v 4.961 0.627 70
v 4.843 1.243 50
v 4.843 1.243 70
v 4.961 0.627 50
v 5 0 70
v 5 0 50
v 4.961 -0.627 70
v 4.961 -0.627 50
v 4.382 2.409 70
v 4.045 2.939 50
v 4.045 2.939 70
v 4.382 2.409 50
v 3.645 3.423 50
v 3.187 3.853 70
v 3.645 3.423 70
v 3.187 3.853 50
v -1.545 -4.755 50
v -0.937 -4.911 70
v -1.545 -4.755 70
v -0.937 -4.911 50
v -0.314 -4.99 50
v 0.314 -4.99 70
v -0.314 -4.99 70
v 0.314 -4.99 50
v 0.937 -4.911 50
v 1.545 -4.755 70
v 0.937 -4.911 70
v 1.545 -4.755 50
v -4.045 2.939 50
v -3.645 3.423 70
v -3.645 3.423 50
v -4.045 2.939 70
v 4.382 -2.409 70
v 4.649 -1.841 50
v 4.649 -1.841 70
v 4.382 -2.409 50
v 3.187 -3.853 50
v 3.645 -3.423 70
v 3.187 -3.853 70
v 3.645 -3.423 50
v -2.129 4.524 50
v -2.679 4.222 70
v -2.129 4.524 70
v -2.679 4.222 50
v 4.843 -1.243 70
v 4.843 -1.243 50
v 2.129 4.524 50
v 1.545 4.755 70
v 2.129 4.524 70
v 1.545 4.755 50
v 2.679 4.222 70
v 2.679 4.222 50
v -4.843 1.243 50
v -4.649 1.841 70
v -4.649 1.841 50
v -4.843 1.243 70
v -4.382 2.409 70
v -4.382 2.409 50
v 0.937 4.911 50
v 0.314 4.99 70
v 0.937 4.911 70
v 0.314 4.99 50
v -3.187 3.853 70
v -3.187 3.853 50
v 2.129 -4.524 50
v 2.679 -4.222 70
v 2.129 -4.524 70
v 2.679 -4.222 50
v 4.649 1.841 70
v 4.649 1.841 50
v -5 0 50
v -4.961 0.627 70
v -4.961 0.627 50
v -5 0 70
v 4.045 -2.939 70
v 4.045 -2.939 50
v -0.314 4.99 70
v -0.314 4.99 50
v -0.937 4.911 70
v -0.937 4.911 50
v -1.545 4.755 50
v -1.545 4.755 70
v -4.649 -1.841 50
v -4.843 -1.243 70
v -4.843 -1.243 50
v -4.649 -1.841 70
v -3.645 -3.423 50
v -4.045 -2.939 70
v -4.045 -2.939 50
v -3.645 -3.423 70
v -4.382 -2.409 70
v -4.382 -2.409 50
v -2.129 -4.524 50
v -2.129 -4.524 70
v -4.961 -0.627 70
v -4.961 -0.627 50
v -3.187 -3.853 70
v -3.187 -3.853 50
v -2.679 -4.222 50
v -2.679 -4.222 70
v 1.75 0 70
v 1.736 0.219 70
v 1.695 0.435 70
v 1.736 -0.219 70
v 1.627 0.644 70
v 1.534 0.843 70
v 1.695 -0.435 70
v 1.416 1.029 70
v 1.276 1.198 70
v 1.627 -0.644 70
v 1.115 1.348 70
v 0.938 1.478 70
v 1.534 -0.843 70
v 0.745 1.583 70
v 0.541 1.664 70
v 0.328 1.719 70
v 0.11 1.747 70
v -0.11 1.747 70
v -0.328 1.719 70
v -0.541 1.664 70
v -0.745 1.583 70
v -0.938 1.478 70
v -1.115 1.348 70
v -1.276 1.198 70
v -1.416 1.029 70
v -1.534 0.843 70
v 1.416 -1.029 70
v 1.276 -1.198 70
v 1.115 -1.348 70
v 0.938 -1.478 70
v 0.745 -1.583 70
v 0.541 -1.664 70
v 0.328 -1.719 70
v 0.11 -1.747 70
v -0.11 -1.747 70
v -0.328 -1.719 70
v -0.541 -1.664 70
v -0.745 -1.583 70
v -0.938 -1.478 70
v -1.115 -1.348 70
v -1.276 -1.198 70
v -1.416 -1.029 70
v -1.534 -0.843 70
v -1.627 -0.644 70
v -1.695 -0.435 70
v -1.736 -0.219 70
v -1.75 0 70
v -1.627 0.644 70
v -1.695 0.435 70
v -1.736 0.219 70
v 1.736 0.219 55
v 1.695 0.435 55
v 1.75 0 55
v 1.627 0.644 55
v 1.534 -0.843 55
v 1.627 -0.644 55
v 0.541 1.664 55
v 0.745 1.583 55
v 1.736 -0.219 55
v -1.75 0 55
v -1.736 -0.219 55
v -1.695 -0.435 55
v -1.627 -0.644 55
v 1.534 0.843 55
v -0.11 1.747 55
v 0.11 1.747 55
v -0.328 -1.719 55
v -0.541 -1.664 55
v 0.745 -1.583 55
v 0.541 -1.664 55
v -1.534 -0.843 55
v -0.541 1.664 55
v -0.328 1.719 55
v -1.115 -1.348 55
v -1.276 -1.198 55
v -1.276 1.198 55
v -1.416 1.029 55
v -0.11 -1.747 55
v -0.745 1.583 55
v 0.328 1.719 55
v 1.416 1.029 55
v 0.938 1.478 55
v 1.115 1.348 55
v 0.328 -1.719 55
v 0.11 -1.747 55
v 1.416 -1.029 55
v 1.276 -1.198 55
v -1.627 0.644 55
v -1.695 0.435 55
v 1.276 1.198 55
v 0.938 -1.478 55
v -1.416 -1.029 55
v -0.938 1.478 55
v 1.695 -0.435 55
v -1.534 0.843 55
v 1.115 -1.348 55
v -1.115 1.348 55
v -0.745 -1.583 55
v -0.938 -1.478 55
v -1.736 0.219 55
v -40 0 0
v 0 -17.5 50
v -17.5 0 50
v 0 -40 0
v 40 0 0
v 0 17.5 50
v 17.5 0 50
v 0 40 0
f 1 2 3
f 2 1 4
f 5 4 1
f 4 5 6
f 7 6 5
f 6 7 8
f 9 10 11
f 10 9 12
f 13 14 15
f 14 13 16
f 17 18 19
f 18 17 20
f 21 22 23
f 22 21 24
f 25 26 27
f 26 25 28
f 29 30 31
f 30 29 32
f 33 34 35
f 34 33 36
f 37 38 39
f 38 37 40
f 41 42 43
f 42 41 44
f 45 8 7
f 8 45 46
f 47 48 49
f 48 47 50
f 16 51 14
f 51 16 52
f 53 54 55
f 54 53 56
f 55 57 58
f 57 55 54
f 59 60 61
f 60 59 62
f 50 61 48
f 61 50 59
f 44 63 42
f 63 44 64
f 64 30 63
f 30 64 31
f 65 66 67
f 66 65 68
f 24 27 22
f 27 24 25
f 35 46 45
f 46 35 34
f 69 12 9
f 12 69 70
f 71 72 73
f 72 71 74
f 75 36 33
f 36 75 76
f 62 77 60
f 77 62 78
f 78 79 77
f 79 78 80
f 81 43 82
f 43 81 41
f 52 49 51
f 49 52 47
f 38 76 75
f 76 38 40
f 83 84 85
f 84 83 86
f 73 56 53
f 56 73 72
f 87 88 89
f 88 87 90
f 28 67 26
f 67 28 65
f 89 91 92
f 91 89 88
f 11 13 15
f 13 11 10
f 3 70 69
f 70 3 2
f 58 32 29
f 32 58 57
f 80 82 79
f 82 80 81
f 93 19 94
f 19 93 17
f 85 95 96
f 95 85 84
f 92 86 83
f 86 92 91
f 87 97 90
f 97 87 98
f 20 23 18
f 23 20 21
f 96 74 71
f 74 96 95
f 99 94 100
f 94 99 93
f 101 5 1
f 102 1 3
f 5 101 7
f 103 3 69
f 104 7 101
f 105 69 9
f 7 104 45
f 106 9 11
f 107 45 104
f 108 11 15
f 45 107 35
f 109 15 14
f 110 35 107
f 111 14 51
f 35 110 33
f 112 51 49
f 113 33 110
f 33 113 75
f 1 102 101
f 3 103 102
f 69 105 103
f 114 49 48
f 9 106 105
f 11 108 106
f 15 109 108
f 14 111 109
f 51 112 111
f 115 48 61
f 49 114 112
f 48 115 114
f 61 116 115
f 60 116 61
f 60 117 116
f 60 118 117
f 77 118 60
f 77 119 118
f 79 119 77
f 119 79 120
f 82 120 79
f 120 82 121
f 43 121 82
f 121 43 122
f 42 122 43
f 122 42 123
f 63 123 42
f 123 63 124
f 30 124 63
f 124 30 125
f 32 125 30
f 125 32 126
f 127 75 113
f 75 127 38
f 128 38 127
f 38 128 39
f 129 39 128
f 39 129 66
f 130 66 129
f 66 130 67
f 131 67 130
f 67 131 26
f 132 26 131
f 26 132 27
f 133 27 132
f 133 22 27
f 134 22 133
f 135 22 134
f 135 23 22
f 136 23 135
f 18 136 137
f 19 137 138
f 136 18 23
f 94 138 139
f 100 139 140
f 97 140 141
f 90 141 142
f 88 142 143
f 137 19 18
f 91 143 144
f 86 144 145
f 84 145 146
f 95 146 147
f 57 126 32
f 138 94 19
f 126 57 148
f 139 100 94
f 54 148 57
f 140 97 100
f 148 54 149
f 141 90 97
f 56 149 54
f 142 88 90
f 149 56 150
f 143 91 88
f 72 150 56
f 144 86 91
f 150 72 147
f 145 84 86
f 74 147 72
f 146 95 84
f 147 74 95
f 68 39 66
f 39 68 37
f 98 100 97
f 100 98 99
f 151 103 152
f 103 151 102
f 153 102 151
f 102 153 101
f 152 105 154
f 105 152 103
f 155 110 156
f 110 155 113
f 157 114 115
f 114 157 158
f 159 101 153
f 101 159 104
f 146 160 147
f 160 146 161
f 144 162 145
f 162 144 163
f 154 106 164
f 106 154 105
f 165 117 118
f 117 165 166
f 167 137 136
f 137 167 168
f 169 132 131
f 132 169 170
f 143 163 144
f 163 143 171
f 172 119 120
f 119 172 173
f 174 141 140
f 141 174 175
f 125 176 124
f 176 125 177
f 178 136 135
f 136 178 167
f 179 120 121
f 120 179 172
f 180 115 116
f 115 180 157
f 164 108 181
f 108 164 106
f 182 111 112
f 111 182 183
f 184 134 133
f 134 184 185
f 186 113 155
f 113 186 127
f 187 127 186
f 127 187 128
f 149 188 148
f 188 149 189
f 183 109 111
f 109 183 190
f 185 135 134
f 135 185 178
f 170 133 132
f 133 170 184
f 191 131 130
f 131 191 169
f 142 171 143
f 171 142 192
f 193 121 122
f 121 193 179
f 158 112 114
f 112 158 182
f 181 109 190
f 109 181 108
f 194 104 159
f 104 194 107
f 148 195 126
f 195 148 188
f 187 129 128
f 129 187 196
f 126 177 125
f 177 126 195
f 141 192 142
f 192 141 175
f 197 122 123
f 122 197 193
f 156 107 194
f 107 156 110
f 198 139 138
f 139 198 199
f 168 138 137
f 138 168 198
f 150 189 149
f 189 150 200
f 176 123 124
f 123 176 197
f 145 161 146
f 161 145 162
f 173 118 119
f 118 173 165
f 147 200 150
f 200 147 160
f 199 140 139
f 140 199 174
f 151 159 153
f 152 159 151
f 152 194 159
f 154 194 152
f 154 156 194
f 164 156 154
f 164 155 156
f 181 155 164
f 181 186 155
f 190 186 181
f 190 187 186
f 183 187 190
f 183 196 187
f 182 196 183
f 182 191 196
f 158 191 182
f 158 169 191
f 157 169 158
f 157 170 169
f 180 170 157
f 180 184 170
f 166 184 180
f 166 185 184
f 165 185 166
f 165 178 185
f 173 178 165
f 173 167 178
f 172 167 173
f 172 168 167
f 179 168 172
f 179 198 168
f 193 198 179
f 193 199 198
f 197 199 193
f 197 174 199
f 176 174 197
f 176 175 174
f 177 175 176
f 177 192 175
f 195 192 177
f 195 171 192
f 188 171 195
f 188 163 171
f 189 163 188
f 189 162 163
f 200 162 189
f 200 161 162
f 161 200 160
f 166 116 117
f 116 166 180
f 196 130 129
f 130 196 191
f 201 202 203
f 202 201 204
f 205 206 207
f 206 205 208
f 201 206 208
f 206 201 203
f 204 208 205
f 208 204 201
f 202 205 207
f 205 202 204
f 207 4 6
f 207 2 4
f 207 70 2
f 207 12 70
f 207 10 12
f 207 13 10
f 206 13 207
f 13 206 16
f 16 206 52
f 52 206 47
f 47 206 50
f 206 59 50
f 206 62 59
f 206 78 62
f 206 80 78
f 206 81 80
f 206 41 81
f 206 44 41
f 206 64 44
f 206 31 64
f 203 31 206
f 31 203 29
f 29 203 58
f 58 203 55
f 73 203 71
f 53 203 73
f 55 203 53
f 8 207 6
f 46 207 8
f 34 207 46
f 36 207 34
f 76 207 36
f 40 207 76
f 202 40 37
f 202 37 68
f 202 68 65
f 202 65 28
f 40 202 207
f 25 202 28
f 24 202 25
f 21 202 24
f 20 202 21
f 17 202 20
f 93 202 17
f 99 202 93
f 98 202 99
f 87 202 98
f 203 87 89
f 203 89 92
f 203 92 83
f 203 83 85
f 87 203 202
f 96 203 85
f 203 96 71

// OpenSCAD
$fn = 50;

base_bottom = 40;
base_top = 35 / 2;
base_height = 50;

top_height = 30;
top_diameter = 10;

hole_height = 25;
hole_diameter = 3.5;


color([0,1,0])
    cylinder(h=base_height, r1=base_bottom, r2=base_top, $fn=4);
translate([0, 0, base_height-10])
    color([0,1,0]) difference() {
        cylinder(h=top_height, d=top_diameter);
        translate([0, 0, hole_height-10])
            cylinder(h=hole_height, d=hole_diameter);
    }
